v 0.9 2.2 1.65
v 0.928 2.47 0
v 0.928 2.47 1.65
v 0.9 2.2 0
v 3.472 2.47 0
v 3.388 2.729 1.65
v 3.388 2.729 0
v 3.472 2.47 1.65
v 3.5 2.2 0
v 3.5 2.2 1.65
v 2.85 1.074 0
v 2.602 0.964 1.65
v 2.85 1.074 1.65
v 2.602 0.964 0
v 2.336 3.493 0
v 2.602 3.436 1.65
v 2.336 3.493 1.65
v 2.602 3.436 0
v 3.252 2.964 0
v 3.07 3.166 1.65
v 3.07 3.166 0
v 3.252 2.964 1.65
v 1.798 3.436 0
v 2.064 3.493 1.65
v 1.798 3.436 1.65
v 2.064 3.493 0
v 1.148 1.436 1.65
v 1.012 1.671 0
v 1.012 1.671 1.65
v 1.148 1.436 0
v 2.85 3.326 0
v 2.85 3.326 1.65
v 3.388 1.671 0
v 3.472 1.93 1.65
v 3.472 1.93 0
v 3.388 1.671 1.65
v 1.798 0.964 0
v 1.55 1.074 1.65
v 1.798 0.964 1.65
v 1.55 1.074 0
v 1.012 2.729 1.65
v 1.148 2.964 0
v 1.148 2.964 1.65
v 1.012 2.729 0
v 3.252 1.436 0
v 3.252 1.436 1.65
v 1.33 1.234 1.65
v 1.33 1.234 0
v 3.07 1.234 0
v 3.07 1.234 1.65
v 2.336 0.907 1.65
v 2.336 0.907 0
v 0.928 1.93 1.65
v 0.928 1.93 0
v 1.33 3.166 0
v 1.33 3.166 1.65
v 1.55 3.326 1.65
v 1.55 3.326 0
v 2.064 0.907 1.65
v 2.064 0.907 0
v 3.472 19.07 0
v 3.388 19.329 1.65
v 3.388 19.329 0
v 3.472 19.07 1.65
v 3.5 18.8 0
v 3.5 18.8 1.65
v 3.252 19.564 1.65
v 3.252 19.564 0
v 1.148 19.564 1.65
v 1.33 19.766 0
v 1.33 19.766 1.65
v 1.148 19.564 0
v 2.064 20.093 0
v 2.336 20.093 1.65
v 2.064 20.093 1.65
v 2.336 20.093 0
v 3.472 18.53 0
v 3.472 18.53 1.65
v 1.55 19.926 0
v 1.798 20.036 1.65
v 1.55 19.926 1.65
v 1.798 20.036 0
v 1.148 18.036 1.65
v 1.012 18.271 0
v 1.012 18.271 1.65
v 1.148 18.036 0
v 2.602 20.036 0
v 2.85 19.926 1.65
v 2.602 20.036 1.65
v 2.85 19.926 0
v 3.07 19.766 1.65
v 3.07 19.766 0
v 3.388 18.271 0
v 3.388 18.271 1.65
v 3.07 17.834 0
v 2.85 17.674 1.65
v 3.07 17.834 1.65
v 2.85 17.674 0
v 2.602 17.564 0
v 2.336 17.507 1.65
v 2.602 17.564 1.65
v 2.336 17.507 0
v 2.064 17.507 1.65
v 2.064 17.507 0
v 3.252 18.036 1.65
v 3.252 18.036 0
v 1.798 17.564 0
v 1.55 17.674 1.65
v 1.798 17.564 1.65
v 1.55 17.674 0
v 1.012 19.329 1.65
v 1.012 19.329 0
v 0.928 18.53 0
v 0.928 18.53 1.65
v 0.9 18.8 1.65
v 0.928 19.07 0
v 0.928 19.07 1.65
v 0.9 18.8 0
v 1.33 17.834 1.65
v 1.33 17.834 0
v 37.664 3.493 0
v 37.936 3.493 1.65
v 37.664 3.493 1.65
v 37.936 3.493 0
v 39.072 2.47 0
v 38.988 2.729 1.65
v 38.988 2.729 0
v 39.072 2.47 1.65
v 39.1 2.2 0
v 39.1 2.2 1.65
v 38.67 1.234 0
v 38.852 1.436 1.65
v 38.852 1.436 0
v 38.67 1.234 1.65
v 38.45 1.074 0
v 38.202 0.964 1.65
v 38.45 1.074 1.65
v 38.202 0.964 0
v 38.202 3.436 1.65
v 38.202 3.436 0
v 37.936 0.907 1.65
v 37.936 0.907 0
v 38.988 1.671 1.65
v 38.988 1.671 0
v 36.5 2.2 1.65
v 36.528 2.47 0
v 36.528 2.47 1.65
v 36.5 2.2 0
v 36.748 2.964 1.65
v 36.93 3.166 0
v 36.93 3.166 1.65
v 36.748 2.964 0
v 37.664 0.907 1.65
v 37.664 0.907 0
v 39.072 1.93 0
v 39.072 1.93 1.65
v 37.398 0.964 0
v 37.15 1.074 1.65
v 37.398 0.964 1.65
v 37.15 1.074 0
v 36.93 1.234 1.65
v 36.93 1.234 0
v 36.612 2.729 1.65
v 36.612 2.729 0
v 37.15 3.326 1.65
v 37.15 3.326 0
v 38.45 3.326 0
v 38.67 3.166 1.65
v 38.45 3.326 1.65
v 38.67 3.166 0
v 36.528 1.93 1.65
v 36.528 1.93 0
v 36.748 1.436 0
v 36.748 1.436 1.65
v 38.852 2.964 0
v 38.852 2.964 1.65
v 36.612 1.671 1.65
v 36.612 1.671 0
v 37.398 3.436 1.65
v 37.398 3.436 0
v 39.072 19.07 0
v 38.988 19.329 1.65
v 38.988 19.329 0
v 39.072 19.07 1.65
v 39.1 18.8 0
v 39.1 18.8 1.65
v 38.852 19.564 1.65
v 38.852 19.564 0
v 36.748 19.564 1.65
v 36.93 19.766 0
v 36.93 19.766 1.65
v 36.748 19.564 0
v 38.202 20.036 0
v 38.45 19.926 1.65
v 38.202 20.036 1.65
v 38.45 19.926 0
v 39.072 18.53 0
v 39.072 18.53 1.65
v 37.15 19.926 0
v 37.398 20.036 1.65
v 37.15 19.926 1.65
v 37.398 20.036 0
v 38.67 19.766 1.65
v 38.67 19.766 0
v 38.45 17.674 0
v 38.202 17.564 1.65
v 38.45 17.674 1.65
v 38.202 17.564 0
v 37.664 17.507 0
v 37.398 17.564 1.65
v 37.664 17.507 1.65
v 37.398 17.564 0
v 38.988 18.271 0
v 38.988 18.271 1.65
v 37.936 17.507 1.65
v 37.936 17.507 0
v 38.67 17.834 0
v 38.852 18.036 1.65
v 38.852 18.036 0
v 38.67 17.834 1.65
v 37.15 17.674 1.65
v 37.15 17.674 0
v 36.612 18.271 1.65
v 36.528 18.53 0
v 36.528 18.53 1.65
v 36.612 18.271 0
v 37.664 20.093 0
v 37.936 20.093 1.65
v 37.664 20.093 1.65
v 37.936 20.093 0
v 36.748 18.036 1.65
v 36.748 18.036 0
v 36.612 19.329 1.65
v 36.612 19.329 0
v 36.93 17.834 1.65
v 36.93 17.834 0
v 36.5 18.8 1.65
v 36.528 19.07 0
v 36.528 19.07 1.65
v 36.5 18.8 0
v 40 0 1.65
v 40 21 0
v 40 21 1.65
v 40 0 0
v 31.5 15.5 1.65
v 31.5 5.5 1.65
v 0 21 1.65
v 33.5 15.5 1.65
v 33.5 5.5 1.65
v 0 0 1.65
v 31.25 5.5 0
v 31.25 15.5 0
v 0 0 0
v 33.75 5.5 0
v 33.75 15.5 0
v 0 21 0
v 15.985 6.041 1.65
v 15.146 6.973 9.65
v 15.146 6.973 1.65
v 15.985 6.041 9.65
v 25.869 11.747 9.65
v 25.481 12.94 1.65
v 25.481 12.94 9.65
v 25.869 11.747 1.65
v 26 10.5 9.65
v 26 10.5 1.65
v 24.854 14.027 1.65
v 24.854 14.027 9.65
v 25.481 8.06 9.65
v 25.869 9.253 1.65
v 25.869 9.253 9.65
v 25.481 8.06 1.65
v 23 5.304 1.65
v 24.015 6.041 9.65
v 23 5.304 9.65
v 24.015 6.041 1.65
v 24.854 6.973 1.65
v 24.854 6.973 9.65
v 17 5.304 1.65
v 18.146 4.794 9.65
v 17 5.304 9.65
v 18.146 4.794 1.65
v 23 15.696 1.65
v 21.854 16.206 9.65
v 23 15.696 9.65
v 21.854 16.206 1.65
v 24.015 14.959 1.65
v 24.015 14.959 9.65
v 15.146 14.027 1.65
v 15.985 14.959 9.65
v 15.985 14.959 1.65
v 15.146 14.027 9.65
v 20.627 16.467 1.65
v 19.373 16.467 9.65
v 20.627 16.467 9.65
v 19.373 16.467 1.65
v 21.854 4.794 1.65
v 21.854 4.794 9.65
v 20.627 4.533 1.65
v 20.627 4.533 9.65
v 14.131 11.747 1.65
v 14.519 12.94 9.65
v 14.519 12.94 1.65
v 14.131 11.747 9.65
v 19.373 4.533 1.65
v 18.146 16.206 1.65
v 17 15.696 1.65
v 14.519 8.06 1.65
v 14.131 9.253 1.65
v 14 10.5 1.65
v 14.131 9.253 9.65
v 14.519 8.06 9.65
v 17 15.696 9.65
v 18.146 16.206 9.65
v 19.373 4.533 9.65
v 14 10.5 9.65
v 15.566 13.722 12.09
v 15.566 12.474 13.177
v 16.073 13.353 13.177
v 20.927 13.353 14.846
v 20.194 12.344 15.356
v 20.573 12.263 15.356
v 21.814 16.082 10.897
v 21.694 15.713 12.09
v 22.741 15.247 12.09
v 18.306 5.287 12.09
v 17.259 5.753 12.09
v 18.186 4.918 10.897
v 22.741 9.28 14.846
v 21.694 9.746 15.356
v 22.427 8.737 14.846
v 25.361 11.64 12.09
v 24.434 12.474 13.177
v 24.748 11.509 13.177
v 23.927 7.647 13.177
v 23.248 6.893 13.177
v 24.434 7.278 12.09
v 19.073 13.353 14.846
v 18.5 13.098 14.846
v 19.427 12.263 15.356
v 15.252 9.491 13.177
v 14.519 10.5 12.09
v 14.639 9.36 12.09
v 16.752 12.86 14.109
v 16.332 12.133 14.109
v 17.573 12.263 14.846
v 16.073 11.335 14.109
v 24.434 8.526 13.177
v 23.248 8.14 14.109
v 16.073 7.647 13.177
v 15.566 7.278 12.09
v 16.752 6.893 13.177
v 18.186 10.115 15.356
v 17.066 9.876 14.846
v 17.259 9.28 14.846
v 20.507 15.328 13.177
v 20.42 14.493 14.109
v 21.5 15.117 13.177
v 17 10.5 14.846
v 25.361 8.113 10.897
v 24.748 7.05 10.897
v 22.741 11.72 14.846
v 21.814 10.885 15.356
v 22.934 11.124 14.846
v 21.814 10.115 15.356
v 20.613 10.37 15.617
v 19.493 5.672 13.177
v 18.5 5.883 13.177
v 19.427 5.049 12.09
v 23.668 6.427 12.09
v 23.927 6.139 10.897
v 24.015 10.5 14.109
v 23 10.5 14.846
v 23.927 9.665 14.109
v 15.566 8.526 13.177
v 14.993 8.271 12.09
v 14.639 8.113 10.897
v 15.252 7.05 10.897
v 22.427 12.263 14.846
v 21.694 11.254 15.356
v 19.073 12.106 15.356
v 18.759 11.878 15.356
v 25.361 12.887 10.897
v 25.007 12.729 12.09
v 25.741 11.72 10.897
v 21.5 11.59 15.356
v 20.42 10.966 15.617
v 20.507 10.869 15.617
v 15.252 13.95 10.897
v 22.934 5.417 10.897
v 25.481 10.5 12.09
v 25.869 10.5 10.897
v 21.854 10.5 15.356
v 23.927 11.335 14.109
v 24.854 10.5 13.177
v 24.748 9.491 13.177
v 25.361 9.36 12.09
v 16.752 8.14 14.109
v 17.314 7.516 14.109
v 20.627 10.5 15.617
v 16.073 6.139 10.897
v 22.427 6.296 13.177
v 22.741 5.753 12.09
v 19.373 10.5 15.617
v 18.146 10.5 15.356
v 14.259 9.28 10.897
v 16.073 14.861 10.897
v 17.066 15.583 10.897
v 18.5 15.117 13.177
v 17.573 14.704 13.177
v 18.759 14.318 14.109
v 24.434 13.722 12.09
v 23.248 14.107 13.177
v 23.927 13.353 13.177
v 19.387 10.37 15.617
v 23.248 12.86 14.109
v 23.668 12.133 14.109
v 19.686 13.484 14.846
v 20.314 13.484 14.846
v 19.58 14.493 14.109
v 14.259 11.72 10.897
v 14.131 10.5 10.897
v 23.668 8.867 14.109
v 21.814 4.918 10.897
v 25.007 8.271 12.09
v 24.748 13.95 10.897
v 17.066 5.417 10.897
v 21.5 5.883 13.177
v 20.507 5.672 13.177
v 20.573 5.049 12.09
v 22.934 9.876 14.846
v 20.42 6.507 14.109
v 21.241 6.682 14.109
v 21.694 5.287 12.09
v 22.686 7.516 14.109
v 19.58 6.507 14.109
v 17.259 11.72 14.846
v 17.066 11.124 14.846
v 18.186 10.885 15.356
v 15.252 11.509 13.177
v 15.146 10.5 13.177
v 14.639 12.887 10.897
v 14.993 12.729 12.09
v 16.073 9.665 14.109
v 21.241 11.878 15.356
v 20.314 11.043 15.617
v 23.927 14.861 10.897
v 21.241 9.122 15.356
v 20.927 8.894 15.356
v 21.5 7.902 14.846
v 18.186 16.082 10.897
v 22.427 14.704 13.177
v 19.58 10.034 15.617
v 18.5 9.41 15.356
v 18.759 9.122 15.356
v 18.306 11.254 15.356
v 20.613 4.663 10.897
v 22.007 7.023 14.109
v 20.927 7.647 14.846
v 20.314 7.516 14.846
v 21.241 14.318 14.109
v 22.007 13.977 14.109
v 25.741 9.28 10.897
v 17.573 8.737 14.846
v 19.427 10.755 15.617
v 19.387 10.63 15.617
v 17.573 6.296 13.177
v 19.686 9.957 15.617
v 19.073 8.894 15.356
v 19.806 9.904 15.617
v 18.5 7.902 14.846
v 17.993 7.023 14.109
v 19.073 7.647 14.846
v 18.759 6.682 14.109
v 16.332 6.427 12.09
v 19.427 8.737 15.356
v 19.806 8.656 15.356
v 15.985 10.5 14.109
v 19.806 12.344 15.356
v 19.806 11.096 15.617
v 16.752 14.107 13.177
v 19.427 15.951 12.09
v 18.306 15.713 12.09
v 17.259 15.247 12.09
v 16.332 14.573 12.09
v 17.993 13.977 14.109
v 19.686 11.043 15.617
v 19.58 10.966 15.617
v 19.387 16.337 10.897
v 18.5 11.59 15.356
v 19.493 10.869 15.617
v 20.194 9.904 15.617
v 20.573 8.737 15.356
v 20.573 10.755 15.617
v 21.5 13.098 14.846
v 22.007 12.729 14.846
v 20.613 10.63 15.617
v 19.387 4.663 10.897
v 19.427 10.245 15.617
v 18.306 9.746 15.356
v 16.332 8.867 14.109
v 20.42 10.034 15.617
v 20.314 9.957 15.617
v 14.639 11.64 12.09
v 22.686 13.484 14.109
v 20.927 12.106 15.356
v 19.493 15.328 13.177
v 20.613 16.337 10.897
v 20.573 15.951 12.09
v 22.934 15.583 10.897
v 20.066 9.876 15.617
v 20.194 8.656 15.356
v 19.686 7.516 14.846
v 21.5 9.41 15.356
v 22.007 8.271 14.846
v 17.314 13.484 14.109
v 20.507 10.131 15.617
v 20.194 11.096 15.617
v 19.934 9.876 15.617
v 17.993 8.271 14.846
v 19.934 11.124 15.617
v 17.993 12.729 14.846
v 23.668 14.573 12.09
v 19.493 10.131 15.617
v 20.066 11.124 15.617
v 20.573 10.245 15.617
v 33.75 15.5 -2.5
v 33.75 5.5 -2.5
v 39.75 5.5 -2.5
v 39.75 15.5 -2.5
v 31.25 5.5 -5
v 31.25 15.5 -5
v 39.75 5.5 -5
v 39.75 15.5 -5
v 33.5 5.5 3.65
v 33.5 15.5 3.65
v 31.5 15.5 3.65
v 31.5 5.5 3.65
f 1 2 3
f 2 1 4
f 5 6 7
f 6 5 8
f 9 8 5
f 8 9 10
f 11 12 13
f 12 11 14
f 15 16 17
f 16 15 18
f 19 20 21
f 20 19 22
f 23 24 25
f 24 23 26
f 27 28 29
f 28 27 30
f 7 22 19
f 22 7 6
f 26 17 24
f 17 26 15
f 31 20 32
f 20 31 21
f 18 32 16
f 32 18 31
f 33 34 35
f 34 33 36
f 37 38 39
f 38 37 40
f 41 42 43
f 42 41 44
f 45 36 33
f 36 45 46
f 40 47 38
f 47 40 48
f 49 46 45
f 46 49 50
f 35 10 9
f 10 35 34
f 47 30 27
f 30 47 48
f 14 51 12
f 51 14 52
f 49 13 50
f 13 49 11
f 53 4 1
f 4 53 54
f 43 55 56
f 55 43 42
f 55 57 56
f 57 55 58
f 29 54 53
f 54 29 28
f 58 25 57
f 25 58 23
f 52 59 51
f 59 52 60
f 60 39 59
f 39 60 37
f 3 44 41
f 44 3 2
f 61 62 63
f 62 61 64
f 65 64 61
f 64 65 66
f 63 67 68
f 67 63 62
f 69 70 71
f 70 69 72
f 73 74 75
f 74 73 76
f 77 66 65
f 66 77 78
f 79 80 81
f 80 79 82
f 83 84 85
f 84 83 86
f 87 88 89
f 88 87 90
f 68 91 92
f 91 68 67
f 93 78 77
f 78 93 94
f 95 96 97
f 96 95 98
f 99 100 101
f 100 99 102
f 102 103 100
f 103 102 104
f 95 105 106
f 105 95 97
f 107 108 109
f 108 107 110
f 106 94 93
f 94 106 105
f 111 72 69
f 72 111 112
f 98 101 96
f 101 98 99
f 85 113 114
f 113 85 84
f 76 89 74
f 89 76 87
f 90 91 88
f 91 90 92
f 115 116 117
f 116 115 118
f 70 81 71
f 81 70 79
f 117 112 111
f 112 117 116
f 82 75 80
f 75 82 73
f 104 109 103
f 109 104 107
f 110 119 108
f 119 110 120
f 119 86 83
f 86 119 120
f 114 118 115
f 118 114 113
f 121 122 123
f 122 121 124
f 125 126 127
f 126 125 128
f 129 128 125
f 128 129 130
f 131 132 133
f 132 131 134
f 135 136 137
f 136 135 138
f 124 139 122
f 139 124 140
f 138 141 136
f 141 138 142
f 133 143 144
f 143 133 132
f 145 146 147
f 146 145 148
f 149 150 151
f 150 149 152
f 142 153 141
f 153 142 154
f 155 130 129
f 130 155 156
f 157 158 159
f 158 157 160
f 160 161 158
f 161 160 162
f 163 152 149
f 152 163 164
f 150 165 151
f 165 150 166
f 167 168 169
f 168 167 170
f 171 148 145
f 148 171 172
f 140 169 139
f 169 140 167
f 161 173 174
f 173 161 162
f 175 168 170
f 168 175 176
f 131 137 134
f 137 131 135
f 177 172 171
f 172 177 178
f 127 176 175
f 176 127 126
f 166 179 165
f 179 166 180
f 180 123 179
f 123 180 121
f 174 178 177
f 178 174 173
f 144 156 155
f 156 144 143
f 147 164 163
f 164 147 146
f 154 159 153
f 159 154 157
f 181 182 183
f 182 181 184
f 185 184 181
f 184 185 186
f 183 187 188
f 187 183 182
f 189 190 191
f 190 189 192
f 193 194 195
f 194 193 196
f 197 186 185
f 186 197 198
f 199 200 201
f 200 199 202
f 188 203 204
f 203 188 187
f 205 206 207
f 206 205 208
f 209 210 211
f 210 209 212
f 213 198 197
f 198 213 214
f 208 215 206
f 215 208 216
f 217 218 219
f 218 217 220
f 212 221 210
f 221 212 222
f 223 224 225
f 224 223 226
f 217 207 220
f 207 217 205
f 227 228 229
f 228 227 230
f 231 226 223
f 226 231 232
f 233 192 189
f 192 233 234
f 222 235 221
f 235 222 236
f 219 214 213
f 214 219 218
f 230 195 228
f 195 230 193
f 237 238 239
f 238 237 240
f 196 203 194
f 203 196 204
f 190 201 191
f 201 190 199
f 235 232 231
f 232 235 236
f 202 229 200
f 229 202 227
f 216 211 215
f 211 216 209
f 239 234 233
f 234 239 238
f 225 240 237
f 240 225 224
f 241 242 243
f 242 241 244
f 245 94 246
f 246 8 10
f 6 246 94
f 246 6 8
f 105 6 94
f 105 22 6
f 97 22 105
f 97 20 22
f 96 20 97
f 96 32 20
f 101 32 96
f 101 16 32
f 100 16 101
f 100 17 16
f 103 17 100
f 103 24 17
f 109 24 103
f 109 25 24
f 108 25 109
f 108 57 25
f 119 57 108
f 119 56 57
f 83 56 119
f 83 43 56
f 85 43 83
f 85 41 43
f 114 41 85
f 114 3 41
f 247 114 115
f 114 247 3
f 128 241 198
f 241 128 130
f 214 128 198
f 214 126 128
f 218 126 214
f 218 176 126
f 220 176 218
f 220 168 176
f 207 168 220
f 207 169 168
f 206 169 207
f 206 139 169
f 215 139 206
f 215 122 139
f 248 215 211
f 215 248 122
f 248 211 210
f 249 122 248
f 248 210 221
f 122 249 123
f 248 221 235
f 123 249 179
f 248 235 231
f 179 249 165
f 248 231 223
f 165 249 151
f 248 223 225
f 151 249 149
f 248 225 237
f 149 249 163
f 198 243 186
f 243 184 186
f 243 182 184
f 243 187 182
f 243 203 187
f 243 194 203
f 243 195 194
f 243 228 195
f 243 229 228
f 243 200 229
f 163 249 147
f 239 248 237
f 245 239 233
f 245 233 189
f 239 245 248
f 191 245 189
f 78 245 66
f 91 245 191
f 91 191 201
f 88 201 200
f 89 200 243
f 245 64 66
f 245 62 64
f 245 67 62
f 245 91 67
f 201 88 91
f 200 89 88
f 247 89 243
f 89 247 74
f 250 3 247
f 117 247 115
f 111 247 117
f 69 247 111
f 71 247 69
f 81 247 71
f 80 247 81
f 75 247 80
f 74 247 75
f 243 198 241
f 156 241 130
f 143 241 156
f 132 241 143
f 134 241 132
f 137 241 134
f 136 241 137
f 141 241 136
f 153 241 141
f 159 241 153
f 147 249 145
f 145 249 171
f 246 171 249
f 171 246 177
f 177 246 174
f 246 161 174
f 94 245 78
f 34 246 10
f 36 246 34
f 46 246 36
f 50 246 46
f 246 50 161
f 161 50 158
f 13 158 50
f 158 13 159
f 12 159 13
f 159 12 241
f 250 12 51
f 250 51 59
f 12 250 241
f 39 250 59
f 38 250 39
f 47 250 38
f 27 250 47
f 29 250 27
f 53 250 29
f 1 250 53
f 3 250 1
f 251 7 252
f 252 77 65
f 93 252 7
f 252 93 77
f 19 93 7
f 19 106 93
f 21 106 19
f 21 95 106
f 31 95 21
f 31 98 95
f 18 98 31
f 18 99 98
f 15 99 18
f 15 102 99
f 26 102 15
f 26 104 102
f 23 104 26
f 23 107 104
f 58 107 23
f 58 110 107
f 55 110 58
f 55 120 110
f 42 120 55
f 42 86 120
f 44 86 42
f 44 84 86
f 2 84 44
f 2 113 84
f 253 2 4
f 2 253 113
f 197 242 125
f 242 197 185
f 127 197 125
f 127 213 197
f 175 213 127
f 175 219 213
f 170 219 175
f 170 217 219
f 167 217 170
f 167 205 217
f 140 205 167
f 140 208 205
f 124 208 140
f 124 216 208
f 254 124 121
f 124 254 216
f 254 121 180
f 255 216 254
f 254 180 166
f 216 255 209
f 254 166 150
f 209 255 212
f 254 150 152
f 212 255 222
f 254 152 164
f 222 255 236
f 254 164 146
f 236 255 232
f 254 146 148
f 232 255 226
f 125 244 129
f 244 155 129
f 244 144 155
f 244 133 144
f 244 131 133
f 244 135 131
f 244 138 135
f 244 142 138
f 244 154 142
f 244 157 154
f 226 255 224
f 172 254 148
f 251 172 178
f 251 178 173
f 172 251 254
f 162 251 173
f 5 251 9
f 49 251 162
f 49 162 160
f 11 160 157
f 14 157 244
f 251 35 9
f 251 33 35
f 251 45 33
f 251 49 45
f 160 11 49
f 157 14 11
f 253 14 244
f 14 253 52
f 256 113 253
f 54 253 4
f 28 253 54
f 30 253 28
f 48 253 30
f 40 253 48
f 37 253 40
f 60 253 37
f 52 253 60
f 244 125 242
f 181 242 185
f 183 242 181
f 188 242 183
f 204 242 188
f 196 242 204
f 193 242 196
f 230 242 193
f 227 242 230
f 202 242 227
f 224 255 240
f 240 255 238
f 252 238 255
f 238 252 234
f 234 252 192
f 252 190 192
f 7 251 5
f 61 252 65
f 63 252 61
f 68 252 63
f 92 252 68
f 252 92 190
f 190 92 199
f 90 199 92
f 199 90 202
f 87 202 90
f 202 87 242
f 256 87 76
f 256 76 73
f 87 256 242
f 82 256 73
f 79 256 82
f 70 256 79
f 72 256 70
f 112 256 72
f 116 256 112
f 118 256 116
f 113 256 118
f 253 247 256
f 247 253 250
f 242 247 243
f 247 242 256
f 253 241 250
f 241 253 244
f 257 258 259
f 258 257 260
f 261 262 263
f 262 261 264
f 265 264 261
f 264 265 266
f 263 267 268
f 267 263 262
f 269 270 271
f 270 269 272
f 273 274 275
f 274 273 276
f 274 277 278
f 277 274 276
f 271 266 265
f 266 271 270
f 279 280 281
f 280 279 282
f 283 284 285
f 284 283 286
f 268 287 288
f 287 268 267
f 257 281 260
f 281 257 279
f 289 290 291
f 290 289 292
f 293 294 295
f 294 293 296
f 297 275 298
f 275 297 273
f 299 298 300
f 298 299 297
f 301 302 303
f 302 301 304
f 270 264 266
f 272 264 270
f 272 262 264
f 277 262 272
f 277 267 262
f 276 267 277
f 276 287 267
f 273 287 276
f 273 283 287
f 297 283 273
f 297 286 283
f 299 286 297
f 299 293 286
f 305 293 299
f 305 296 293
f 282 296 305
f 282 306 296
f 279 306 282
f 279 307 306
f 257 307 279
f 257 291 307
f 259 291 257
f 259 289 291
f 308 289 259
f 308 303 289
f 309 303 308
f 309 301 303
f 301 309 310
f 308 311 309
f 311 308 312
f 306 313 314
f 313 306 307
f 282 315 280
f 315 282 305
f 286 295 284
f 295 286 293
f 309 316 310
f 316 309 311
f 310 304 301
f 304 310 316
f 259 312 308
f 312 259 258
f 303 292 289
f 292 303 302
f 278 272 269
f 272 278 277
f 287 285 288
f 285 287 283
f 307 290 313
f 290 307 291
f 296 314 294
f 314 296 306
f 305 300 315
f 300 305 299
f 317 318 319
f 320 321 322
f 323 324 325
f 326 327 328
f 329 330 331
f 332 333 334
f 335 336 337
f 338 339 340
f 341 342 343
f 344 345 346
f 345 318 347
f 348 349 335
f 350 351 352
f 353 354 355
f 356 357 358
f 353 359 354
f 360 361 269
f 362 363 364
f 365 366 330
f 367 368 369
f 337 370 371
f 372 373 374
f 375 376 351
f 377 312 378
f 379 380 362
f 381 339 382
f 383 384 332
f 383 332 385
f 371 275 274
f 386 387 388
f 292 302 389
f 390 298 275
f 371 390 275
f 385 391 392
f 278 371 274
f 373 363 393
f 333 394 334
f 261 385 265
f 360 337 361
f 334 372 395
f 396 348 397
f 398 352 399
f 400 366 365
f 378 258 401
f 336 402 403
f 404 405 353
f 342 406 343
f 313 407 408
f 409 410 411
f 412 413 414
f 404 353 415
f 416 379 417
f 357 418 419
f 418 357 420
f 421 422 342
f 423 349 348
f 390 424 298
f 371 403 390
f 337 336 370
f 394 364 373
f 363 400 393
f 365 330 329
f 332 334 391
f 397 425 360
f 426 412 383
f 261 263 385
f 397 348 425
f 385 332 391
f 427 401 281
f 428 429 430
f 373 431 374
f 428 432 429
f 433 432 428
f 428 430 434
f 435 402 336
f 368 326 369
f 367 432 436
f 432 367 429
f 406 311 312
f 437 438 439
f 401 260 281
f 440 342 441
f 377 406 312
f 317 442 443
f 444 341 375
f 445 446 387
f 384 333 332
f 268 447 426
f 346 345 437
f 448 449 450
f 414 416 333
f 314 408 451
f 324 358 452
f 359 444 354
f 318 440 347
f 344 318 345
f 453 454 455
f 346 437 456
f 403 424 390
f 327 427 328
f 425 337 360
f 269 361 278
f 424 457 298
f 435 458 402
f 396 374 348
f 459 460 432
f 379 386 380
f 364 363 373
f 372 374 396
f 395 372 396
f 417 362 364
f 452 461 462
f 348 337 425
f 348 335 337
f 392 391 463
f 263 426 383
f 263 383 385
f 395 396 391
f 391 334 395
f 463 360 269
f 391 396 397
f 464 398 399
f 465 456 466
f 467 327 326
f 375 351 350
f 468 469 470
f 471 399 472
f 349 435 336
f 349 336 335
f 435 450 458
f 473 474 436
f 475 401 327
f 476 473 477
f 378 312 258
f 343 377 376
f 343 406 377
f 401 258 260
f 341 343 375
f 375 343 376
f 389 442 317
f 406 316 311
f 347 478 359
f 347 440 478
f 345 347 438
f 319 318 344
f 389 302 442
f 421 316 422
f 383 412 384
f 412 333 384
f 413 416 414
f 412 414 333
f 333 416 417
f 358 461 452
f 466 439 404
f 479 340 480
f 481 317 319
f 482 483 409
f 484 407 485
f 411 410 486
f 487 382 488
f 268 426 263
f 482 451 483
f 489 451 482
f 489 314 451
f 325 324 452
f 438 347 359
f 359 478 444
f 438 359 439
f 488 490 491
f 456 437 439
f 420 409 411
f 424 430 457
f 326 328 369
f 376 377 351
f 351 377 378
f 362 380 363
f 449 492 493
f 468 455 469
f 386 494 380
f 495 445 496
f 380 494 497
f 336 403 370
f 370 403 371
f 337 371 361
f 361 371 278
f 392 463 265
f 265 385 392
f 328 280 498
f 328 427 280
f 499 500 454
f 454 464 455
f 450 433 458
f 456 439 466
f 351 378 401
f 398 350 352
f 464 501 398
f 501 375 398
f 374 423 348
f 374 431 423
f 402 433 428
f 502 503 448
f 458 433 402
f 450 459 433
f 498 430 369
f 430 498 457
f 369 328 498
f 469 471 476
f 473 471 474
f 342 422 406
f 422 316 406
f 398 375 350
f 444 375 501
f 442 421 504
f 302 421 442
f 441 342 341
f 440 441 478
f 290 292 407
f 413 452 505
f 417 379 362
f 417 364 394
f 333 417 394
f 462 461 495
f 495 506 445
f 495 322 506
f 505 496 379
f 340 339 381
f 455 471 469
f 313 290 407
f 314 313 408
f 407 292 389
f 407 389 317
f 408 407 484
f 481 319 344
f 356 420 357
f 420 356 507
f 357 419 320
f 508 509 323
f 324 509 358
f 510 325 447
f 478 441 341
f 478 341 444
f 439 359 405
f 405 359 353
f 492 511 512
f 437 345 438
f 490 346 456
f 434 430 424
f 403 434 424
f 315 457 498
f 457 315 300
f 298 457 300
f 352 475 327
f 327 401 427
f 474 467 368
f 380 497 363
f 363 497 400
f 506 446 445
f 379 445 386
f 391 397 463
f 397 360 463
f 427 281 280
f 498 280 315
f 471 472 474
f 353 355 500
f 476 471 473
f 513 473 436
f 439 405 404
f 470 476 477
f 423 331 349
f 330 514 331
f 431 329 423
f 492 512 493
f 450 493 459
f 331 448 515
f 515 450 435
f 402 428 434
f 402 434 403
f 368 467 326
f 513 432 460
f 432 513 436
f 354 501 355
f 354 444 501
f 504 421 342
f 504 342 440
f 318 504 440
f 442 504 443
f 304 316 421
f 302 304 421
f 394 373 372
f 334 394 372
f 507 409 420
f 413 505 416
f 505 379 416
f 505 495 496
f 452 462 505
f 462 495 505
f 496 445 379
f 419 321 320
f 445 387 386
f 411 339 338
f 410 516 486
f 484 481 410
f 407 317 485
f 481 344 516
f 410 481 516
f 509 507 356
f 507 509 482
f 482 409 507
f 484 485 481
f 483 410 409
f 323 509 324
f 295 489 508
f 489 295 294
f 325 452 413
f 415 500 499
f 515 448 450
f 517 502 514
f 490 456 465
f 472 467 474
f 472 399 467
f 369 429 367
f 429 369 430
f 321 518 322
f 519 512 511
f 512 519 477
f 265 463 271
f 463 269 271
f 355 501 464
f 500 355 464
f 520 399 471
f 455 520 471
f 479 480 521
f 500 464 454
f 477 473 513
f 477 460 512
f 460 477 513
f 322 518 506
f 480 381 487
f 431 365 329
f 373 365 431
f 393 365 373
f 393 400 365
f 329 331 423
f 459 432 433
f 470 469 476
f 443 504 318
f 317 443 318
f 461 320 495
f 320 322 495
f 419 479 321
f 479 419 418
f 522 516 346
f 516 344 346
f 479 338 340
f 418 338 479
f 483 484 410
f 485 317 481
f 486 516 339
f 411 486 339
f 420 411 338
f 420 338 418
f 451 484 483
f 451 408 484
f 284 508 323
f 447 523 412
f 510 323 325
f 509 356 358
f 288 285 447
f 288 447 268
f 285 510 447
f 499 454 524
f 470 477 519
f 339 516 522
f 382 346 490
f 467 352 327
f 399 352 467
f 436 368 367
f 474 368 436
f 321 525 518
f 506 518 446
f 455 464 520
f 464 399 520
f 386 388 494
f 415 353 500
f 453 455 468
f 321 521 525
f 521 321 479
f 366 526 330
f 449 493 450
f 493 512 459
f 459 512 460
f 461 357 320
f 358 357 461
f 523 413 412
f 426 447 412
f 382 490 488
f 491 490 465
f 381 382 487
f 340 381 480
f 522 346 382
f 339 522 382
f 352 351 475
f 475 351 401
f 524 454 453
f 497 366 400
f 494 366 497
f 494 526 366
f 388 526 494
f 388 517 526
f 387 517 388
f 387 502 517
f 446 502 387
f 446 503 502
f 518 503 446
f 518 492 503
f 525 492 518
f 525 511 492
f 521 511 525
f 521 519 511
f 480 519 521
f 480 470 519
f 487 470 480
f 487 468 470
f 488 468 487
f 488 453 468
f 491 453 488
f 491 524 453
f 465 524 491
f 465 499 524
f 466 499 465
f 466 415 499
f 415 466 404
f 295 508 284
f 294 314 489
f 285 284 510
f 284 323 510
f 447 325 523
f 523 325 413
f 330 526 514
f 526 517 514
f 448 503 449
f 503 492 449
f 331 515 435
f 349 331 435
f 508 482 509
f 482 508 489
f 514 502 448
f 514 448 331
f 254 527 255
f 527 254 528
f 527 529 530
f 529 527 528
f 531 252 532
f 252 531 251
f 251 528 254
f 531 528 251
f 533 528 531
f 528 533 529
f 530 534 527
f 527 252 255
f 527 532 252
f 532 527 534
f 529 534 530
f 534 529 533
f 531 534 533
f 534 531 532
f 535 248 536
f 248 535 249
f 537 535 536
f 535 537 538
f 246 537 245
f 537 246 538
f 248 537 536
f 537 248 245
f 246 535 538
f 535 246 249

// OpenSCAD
// file: pir_SBC_dimensions.scad
// PIR SBC-PIR dimensions
pir_height = 1.65;
pir_width = 21;
pir_length = 40;
pir_lens_height = 8;
pir_lens_radius = 6;

pir_screw_hole_radius = 1.3;
pir_screw_hole_margin = 0.9;
// main file
include<pir_SBC_dimensions.scad>;

module PIR_SBC() {
    $fn = 30;

    eps = 0.01;

    black = [0.05, 0.05, 0.05];
    white = [1, 1, 1];

    module chassis() {
        color(black) {
            translate([0, 0, 0]) {
                cube([pir_length, pir_width, pir_height]);
            }
        }
    }

    module lens() {
        color (white) {
            union() {
                cylinder(h=pir_lens_height, r=pir_lens_radius);
                translate([0, 0, pir_lens_height])
                    sphere(pir_lens_radius);
                
            }
        }
    }

    module pins() {
        color (white) {
            cube([2, 10, 2]);
        }
    }

    module connector() {
        union() {
            color (black) {
                cube([2.5, 10, 2.5]);
            }
            color (white) {
                translate([0, 0, 2.5])
                    cube([8.5, 10, 2.5]);
            }
        }
    }
    
    module screw_hole() {
        cylinder(pir_height + eps, d=2*pir_screw_hole_radius);
    }

    translate([0, 0, 0]) {
        difference() {
            chassis();
            screw_hole_distance = pir_screw_hole_radius + pir_screw_hole_margin;
            for (i = [screw_hole_distance, pir_length - screw_hole_distance]) {
                for (j = [screw_hole_distance, pir_width - screw_hole_distance]) {
                    translate([i, j, -eps/2])
                       screw_hole();
                }
            }
        }
        translate([pir_length/2, pir_width/2, pir_height]) {
            lens();
        }
        translate([31.25, 15.5, 0])
            rotate([0, 180, 180])
                connector();
        translate([31.5, 5.5, pir_height])
            pins();
    }
}

// Example usage:
PIR_SBC();
